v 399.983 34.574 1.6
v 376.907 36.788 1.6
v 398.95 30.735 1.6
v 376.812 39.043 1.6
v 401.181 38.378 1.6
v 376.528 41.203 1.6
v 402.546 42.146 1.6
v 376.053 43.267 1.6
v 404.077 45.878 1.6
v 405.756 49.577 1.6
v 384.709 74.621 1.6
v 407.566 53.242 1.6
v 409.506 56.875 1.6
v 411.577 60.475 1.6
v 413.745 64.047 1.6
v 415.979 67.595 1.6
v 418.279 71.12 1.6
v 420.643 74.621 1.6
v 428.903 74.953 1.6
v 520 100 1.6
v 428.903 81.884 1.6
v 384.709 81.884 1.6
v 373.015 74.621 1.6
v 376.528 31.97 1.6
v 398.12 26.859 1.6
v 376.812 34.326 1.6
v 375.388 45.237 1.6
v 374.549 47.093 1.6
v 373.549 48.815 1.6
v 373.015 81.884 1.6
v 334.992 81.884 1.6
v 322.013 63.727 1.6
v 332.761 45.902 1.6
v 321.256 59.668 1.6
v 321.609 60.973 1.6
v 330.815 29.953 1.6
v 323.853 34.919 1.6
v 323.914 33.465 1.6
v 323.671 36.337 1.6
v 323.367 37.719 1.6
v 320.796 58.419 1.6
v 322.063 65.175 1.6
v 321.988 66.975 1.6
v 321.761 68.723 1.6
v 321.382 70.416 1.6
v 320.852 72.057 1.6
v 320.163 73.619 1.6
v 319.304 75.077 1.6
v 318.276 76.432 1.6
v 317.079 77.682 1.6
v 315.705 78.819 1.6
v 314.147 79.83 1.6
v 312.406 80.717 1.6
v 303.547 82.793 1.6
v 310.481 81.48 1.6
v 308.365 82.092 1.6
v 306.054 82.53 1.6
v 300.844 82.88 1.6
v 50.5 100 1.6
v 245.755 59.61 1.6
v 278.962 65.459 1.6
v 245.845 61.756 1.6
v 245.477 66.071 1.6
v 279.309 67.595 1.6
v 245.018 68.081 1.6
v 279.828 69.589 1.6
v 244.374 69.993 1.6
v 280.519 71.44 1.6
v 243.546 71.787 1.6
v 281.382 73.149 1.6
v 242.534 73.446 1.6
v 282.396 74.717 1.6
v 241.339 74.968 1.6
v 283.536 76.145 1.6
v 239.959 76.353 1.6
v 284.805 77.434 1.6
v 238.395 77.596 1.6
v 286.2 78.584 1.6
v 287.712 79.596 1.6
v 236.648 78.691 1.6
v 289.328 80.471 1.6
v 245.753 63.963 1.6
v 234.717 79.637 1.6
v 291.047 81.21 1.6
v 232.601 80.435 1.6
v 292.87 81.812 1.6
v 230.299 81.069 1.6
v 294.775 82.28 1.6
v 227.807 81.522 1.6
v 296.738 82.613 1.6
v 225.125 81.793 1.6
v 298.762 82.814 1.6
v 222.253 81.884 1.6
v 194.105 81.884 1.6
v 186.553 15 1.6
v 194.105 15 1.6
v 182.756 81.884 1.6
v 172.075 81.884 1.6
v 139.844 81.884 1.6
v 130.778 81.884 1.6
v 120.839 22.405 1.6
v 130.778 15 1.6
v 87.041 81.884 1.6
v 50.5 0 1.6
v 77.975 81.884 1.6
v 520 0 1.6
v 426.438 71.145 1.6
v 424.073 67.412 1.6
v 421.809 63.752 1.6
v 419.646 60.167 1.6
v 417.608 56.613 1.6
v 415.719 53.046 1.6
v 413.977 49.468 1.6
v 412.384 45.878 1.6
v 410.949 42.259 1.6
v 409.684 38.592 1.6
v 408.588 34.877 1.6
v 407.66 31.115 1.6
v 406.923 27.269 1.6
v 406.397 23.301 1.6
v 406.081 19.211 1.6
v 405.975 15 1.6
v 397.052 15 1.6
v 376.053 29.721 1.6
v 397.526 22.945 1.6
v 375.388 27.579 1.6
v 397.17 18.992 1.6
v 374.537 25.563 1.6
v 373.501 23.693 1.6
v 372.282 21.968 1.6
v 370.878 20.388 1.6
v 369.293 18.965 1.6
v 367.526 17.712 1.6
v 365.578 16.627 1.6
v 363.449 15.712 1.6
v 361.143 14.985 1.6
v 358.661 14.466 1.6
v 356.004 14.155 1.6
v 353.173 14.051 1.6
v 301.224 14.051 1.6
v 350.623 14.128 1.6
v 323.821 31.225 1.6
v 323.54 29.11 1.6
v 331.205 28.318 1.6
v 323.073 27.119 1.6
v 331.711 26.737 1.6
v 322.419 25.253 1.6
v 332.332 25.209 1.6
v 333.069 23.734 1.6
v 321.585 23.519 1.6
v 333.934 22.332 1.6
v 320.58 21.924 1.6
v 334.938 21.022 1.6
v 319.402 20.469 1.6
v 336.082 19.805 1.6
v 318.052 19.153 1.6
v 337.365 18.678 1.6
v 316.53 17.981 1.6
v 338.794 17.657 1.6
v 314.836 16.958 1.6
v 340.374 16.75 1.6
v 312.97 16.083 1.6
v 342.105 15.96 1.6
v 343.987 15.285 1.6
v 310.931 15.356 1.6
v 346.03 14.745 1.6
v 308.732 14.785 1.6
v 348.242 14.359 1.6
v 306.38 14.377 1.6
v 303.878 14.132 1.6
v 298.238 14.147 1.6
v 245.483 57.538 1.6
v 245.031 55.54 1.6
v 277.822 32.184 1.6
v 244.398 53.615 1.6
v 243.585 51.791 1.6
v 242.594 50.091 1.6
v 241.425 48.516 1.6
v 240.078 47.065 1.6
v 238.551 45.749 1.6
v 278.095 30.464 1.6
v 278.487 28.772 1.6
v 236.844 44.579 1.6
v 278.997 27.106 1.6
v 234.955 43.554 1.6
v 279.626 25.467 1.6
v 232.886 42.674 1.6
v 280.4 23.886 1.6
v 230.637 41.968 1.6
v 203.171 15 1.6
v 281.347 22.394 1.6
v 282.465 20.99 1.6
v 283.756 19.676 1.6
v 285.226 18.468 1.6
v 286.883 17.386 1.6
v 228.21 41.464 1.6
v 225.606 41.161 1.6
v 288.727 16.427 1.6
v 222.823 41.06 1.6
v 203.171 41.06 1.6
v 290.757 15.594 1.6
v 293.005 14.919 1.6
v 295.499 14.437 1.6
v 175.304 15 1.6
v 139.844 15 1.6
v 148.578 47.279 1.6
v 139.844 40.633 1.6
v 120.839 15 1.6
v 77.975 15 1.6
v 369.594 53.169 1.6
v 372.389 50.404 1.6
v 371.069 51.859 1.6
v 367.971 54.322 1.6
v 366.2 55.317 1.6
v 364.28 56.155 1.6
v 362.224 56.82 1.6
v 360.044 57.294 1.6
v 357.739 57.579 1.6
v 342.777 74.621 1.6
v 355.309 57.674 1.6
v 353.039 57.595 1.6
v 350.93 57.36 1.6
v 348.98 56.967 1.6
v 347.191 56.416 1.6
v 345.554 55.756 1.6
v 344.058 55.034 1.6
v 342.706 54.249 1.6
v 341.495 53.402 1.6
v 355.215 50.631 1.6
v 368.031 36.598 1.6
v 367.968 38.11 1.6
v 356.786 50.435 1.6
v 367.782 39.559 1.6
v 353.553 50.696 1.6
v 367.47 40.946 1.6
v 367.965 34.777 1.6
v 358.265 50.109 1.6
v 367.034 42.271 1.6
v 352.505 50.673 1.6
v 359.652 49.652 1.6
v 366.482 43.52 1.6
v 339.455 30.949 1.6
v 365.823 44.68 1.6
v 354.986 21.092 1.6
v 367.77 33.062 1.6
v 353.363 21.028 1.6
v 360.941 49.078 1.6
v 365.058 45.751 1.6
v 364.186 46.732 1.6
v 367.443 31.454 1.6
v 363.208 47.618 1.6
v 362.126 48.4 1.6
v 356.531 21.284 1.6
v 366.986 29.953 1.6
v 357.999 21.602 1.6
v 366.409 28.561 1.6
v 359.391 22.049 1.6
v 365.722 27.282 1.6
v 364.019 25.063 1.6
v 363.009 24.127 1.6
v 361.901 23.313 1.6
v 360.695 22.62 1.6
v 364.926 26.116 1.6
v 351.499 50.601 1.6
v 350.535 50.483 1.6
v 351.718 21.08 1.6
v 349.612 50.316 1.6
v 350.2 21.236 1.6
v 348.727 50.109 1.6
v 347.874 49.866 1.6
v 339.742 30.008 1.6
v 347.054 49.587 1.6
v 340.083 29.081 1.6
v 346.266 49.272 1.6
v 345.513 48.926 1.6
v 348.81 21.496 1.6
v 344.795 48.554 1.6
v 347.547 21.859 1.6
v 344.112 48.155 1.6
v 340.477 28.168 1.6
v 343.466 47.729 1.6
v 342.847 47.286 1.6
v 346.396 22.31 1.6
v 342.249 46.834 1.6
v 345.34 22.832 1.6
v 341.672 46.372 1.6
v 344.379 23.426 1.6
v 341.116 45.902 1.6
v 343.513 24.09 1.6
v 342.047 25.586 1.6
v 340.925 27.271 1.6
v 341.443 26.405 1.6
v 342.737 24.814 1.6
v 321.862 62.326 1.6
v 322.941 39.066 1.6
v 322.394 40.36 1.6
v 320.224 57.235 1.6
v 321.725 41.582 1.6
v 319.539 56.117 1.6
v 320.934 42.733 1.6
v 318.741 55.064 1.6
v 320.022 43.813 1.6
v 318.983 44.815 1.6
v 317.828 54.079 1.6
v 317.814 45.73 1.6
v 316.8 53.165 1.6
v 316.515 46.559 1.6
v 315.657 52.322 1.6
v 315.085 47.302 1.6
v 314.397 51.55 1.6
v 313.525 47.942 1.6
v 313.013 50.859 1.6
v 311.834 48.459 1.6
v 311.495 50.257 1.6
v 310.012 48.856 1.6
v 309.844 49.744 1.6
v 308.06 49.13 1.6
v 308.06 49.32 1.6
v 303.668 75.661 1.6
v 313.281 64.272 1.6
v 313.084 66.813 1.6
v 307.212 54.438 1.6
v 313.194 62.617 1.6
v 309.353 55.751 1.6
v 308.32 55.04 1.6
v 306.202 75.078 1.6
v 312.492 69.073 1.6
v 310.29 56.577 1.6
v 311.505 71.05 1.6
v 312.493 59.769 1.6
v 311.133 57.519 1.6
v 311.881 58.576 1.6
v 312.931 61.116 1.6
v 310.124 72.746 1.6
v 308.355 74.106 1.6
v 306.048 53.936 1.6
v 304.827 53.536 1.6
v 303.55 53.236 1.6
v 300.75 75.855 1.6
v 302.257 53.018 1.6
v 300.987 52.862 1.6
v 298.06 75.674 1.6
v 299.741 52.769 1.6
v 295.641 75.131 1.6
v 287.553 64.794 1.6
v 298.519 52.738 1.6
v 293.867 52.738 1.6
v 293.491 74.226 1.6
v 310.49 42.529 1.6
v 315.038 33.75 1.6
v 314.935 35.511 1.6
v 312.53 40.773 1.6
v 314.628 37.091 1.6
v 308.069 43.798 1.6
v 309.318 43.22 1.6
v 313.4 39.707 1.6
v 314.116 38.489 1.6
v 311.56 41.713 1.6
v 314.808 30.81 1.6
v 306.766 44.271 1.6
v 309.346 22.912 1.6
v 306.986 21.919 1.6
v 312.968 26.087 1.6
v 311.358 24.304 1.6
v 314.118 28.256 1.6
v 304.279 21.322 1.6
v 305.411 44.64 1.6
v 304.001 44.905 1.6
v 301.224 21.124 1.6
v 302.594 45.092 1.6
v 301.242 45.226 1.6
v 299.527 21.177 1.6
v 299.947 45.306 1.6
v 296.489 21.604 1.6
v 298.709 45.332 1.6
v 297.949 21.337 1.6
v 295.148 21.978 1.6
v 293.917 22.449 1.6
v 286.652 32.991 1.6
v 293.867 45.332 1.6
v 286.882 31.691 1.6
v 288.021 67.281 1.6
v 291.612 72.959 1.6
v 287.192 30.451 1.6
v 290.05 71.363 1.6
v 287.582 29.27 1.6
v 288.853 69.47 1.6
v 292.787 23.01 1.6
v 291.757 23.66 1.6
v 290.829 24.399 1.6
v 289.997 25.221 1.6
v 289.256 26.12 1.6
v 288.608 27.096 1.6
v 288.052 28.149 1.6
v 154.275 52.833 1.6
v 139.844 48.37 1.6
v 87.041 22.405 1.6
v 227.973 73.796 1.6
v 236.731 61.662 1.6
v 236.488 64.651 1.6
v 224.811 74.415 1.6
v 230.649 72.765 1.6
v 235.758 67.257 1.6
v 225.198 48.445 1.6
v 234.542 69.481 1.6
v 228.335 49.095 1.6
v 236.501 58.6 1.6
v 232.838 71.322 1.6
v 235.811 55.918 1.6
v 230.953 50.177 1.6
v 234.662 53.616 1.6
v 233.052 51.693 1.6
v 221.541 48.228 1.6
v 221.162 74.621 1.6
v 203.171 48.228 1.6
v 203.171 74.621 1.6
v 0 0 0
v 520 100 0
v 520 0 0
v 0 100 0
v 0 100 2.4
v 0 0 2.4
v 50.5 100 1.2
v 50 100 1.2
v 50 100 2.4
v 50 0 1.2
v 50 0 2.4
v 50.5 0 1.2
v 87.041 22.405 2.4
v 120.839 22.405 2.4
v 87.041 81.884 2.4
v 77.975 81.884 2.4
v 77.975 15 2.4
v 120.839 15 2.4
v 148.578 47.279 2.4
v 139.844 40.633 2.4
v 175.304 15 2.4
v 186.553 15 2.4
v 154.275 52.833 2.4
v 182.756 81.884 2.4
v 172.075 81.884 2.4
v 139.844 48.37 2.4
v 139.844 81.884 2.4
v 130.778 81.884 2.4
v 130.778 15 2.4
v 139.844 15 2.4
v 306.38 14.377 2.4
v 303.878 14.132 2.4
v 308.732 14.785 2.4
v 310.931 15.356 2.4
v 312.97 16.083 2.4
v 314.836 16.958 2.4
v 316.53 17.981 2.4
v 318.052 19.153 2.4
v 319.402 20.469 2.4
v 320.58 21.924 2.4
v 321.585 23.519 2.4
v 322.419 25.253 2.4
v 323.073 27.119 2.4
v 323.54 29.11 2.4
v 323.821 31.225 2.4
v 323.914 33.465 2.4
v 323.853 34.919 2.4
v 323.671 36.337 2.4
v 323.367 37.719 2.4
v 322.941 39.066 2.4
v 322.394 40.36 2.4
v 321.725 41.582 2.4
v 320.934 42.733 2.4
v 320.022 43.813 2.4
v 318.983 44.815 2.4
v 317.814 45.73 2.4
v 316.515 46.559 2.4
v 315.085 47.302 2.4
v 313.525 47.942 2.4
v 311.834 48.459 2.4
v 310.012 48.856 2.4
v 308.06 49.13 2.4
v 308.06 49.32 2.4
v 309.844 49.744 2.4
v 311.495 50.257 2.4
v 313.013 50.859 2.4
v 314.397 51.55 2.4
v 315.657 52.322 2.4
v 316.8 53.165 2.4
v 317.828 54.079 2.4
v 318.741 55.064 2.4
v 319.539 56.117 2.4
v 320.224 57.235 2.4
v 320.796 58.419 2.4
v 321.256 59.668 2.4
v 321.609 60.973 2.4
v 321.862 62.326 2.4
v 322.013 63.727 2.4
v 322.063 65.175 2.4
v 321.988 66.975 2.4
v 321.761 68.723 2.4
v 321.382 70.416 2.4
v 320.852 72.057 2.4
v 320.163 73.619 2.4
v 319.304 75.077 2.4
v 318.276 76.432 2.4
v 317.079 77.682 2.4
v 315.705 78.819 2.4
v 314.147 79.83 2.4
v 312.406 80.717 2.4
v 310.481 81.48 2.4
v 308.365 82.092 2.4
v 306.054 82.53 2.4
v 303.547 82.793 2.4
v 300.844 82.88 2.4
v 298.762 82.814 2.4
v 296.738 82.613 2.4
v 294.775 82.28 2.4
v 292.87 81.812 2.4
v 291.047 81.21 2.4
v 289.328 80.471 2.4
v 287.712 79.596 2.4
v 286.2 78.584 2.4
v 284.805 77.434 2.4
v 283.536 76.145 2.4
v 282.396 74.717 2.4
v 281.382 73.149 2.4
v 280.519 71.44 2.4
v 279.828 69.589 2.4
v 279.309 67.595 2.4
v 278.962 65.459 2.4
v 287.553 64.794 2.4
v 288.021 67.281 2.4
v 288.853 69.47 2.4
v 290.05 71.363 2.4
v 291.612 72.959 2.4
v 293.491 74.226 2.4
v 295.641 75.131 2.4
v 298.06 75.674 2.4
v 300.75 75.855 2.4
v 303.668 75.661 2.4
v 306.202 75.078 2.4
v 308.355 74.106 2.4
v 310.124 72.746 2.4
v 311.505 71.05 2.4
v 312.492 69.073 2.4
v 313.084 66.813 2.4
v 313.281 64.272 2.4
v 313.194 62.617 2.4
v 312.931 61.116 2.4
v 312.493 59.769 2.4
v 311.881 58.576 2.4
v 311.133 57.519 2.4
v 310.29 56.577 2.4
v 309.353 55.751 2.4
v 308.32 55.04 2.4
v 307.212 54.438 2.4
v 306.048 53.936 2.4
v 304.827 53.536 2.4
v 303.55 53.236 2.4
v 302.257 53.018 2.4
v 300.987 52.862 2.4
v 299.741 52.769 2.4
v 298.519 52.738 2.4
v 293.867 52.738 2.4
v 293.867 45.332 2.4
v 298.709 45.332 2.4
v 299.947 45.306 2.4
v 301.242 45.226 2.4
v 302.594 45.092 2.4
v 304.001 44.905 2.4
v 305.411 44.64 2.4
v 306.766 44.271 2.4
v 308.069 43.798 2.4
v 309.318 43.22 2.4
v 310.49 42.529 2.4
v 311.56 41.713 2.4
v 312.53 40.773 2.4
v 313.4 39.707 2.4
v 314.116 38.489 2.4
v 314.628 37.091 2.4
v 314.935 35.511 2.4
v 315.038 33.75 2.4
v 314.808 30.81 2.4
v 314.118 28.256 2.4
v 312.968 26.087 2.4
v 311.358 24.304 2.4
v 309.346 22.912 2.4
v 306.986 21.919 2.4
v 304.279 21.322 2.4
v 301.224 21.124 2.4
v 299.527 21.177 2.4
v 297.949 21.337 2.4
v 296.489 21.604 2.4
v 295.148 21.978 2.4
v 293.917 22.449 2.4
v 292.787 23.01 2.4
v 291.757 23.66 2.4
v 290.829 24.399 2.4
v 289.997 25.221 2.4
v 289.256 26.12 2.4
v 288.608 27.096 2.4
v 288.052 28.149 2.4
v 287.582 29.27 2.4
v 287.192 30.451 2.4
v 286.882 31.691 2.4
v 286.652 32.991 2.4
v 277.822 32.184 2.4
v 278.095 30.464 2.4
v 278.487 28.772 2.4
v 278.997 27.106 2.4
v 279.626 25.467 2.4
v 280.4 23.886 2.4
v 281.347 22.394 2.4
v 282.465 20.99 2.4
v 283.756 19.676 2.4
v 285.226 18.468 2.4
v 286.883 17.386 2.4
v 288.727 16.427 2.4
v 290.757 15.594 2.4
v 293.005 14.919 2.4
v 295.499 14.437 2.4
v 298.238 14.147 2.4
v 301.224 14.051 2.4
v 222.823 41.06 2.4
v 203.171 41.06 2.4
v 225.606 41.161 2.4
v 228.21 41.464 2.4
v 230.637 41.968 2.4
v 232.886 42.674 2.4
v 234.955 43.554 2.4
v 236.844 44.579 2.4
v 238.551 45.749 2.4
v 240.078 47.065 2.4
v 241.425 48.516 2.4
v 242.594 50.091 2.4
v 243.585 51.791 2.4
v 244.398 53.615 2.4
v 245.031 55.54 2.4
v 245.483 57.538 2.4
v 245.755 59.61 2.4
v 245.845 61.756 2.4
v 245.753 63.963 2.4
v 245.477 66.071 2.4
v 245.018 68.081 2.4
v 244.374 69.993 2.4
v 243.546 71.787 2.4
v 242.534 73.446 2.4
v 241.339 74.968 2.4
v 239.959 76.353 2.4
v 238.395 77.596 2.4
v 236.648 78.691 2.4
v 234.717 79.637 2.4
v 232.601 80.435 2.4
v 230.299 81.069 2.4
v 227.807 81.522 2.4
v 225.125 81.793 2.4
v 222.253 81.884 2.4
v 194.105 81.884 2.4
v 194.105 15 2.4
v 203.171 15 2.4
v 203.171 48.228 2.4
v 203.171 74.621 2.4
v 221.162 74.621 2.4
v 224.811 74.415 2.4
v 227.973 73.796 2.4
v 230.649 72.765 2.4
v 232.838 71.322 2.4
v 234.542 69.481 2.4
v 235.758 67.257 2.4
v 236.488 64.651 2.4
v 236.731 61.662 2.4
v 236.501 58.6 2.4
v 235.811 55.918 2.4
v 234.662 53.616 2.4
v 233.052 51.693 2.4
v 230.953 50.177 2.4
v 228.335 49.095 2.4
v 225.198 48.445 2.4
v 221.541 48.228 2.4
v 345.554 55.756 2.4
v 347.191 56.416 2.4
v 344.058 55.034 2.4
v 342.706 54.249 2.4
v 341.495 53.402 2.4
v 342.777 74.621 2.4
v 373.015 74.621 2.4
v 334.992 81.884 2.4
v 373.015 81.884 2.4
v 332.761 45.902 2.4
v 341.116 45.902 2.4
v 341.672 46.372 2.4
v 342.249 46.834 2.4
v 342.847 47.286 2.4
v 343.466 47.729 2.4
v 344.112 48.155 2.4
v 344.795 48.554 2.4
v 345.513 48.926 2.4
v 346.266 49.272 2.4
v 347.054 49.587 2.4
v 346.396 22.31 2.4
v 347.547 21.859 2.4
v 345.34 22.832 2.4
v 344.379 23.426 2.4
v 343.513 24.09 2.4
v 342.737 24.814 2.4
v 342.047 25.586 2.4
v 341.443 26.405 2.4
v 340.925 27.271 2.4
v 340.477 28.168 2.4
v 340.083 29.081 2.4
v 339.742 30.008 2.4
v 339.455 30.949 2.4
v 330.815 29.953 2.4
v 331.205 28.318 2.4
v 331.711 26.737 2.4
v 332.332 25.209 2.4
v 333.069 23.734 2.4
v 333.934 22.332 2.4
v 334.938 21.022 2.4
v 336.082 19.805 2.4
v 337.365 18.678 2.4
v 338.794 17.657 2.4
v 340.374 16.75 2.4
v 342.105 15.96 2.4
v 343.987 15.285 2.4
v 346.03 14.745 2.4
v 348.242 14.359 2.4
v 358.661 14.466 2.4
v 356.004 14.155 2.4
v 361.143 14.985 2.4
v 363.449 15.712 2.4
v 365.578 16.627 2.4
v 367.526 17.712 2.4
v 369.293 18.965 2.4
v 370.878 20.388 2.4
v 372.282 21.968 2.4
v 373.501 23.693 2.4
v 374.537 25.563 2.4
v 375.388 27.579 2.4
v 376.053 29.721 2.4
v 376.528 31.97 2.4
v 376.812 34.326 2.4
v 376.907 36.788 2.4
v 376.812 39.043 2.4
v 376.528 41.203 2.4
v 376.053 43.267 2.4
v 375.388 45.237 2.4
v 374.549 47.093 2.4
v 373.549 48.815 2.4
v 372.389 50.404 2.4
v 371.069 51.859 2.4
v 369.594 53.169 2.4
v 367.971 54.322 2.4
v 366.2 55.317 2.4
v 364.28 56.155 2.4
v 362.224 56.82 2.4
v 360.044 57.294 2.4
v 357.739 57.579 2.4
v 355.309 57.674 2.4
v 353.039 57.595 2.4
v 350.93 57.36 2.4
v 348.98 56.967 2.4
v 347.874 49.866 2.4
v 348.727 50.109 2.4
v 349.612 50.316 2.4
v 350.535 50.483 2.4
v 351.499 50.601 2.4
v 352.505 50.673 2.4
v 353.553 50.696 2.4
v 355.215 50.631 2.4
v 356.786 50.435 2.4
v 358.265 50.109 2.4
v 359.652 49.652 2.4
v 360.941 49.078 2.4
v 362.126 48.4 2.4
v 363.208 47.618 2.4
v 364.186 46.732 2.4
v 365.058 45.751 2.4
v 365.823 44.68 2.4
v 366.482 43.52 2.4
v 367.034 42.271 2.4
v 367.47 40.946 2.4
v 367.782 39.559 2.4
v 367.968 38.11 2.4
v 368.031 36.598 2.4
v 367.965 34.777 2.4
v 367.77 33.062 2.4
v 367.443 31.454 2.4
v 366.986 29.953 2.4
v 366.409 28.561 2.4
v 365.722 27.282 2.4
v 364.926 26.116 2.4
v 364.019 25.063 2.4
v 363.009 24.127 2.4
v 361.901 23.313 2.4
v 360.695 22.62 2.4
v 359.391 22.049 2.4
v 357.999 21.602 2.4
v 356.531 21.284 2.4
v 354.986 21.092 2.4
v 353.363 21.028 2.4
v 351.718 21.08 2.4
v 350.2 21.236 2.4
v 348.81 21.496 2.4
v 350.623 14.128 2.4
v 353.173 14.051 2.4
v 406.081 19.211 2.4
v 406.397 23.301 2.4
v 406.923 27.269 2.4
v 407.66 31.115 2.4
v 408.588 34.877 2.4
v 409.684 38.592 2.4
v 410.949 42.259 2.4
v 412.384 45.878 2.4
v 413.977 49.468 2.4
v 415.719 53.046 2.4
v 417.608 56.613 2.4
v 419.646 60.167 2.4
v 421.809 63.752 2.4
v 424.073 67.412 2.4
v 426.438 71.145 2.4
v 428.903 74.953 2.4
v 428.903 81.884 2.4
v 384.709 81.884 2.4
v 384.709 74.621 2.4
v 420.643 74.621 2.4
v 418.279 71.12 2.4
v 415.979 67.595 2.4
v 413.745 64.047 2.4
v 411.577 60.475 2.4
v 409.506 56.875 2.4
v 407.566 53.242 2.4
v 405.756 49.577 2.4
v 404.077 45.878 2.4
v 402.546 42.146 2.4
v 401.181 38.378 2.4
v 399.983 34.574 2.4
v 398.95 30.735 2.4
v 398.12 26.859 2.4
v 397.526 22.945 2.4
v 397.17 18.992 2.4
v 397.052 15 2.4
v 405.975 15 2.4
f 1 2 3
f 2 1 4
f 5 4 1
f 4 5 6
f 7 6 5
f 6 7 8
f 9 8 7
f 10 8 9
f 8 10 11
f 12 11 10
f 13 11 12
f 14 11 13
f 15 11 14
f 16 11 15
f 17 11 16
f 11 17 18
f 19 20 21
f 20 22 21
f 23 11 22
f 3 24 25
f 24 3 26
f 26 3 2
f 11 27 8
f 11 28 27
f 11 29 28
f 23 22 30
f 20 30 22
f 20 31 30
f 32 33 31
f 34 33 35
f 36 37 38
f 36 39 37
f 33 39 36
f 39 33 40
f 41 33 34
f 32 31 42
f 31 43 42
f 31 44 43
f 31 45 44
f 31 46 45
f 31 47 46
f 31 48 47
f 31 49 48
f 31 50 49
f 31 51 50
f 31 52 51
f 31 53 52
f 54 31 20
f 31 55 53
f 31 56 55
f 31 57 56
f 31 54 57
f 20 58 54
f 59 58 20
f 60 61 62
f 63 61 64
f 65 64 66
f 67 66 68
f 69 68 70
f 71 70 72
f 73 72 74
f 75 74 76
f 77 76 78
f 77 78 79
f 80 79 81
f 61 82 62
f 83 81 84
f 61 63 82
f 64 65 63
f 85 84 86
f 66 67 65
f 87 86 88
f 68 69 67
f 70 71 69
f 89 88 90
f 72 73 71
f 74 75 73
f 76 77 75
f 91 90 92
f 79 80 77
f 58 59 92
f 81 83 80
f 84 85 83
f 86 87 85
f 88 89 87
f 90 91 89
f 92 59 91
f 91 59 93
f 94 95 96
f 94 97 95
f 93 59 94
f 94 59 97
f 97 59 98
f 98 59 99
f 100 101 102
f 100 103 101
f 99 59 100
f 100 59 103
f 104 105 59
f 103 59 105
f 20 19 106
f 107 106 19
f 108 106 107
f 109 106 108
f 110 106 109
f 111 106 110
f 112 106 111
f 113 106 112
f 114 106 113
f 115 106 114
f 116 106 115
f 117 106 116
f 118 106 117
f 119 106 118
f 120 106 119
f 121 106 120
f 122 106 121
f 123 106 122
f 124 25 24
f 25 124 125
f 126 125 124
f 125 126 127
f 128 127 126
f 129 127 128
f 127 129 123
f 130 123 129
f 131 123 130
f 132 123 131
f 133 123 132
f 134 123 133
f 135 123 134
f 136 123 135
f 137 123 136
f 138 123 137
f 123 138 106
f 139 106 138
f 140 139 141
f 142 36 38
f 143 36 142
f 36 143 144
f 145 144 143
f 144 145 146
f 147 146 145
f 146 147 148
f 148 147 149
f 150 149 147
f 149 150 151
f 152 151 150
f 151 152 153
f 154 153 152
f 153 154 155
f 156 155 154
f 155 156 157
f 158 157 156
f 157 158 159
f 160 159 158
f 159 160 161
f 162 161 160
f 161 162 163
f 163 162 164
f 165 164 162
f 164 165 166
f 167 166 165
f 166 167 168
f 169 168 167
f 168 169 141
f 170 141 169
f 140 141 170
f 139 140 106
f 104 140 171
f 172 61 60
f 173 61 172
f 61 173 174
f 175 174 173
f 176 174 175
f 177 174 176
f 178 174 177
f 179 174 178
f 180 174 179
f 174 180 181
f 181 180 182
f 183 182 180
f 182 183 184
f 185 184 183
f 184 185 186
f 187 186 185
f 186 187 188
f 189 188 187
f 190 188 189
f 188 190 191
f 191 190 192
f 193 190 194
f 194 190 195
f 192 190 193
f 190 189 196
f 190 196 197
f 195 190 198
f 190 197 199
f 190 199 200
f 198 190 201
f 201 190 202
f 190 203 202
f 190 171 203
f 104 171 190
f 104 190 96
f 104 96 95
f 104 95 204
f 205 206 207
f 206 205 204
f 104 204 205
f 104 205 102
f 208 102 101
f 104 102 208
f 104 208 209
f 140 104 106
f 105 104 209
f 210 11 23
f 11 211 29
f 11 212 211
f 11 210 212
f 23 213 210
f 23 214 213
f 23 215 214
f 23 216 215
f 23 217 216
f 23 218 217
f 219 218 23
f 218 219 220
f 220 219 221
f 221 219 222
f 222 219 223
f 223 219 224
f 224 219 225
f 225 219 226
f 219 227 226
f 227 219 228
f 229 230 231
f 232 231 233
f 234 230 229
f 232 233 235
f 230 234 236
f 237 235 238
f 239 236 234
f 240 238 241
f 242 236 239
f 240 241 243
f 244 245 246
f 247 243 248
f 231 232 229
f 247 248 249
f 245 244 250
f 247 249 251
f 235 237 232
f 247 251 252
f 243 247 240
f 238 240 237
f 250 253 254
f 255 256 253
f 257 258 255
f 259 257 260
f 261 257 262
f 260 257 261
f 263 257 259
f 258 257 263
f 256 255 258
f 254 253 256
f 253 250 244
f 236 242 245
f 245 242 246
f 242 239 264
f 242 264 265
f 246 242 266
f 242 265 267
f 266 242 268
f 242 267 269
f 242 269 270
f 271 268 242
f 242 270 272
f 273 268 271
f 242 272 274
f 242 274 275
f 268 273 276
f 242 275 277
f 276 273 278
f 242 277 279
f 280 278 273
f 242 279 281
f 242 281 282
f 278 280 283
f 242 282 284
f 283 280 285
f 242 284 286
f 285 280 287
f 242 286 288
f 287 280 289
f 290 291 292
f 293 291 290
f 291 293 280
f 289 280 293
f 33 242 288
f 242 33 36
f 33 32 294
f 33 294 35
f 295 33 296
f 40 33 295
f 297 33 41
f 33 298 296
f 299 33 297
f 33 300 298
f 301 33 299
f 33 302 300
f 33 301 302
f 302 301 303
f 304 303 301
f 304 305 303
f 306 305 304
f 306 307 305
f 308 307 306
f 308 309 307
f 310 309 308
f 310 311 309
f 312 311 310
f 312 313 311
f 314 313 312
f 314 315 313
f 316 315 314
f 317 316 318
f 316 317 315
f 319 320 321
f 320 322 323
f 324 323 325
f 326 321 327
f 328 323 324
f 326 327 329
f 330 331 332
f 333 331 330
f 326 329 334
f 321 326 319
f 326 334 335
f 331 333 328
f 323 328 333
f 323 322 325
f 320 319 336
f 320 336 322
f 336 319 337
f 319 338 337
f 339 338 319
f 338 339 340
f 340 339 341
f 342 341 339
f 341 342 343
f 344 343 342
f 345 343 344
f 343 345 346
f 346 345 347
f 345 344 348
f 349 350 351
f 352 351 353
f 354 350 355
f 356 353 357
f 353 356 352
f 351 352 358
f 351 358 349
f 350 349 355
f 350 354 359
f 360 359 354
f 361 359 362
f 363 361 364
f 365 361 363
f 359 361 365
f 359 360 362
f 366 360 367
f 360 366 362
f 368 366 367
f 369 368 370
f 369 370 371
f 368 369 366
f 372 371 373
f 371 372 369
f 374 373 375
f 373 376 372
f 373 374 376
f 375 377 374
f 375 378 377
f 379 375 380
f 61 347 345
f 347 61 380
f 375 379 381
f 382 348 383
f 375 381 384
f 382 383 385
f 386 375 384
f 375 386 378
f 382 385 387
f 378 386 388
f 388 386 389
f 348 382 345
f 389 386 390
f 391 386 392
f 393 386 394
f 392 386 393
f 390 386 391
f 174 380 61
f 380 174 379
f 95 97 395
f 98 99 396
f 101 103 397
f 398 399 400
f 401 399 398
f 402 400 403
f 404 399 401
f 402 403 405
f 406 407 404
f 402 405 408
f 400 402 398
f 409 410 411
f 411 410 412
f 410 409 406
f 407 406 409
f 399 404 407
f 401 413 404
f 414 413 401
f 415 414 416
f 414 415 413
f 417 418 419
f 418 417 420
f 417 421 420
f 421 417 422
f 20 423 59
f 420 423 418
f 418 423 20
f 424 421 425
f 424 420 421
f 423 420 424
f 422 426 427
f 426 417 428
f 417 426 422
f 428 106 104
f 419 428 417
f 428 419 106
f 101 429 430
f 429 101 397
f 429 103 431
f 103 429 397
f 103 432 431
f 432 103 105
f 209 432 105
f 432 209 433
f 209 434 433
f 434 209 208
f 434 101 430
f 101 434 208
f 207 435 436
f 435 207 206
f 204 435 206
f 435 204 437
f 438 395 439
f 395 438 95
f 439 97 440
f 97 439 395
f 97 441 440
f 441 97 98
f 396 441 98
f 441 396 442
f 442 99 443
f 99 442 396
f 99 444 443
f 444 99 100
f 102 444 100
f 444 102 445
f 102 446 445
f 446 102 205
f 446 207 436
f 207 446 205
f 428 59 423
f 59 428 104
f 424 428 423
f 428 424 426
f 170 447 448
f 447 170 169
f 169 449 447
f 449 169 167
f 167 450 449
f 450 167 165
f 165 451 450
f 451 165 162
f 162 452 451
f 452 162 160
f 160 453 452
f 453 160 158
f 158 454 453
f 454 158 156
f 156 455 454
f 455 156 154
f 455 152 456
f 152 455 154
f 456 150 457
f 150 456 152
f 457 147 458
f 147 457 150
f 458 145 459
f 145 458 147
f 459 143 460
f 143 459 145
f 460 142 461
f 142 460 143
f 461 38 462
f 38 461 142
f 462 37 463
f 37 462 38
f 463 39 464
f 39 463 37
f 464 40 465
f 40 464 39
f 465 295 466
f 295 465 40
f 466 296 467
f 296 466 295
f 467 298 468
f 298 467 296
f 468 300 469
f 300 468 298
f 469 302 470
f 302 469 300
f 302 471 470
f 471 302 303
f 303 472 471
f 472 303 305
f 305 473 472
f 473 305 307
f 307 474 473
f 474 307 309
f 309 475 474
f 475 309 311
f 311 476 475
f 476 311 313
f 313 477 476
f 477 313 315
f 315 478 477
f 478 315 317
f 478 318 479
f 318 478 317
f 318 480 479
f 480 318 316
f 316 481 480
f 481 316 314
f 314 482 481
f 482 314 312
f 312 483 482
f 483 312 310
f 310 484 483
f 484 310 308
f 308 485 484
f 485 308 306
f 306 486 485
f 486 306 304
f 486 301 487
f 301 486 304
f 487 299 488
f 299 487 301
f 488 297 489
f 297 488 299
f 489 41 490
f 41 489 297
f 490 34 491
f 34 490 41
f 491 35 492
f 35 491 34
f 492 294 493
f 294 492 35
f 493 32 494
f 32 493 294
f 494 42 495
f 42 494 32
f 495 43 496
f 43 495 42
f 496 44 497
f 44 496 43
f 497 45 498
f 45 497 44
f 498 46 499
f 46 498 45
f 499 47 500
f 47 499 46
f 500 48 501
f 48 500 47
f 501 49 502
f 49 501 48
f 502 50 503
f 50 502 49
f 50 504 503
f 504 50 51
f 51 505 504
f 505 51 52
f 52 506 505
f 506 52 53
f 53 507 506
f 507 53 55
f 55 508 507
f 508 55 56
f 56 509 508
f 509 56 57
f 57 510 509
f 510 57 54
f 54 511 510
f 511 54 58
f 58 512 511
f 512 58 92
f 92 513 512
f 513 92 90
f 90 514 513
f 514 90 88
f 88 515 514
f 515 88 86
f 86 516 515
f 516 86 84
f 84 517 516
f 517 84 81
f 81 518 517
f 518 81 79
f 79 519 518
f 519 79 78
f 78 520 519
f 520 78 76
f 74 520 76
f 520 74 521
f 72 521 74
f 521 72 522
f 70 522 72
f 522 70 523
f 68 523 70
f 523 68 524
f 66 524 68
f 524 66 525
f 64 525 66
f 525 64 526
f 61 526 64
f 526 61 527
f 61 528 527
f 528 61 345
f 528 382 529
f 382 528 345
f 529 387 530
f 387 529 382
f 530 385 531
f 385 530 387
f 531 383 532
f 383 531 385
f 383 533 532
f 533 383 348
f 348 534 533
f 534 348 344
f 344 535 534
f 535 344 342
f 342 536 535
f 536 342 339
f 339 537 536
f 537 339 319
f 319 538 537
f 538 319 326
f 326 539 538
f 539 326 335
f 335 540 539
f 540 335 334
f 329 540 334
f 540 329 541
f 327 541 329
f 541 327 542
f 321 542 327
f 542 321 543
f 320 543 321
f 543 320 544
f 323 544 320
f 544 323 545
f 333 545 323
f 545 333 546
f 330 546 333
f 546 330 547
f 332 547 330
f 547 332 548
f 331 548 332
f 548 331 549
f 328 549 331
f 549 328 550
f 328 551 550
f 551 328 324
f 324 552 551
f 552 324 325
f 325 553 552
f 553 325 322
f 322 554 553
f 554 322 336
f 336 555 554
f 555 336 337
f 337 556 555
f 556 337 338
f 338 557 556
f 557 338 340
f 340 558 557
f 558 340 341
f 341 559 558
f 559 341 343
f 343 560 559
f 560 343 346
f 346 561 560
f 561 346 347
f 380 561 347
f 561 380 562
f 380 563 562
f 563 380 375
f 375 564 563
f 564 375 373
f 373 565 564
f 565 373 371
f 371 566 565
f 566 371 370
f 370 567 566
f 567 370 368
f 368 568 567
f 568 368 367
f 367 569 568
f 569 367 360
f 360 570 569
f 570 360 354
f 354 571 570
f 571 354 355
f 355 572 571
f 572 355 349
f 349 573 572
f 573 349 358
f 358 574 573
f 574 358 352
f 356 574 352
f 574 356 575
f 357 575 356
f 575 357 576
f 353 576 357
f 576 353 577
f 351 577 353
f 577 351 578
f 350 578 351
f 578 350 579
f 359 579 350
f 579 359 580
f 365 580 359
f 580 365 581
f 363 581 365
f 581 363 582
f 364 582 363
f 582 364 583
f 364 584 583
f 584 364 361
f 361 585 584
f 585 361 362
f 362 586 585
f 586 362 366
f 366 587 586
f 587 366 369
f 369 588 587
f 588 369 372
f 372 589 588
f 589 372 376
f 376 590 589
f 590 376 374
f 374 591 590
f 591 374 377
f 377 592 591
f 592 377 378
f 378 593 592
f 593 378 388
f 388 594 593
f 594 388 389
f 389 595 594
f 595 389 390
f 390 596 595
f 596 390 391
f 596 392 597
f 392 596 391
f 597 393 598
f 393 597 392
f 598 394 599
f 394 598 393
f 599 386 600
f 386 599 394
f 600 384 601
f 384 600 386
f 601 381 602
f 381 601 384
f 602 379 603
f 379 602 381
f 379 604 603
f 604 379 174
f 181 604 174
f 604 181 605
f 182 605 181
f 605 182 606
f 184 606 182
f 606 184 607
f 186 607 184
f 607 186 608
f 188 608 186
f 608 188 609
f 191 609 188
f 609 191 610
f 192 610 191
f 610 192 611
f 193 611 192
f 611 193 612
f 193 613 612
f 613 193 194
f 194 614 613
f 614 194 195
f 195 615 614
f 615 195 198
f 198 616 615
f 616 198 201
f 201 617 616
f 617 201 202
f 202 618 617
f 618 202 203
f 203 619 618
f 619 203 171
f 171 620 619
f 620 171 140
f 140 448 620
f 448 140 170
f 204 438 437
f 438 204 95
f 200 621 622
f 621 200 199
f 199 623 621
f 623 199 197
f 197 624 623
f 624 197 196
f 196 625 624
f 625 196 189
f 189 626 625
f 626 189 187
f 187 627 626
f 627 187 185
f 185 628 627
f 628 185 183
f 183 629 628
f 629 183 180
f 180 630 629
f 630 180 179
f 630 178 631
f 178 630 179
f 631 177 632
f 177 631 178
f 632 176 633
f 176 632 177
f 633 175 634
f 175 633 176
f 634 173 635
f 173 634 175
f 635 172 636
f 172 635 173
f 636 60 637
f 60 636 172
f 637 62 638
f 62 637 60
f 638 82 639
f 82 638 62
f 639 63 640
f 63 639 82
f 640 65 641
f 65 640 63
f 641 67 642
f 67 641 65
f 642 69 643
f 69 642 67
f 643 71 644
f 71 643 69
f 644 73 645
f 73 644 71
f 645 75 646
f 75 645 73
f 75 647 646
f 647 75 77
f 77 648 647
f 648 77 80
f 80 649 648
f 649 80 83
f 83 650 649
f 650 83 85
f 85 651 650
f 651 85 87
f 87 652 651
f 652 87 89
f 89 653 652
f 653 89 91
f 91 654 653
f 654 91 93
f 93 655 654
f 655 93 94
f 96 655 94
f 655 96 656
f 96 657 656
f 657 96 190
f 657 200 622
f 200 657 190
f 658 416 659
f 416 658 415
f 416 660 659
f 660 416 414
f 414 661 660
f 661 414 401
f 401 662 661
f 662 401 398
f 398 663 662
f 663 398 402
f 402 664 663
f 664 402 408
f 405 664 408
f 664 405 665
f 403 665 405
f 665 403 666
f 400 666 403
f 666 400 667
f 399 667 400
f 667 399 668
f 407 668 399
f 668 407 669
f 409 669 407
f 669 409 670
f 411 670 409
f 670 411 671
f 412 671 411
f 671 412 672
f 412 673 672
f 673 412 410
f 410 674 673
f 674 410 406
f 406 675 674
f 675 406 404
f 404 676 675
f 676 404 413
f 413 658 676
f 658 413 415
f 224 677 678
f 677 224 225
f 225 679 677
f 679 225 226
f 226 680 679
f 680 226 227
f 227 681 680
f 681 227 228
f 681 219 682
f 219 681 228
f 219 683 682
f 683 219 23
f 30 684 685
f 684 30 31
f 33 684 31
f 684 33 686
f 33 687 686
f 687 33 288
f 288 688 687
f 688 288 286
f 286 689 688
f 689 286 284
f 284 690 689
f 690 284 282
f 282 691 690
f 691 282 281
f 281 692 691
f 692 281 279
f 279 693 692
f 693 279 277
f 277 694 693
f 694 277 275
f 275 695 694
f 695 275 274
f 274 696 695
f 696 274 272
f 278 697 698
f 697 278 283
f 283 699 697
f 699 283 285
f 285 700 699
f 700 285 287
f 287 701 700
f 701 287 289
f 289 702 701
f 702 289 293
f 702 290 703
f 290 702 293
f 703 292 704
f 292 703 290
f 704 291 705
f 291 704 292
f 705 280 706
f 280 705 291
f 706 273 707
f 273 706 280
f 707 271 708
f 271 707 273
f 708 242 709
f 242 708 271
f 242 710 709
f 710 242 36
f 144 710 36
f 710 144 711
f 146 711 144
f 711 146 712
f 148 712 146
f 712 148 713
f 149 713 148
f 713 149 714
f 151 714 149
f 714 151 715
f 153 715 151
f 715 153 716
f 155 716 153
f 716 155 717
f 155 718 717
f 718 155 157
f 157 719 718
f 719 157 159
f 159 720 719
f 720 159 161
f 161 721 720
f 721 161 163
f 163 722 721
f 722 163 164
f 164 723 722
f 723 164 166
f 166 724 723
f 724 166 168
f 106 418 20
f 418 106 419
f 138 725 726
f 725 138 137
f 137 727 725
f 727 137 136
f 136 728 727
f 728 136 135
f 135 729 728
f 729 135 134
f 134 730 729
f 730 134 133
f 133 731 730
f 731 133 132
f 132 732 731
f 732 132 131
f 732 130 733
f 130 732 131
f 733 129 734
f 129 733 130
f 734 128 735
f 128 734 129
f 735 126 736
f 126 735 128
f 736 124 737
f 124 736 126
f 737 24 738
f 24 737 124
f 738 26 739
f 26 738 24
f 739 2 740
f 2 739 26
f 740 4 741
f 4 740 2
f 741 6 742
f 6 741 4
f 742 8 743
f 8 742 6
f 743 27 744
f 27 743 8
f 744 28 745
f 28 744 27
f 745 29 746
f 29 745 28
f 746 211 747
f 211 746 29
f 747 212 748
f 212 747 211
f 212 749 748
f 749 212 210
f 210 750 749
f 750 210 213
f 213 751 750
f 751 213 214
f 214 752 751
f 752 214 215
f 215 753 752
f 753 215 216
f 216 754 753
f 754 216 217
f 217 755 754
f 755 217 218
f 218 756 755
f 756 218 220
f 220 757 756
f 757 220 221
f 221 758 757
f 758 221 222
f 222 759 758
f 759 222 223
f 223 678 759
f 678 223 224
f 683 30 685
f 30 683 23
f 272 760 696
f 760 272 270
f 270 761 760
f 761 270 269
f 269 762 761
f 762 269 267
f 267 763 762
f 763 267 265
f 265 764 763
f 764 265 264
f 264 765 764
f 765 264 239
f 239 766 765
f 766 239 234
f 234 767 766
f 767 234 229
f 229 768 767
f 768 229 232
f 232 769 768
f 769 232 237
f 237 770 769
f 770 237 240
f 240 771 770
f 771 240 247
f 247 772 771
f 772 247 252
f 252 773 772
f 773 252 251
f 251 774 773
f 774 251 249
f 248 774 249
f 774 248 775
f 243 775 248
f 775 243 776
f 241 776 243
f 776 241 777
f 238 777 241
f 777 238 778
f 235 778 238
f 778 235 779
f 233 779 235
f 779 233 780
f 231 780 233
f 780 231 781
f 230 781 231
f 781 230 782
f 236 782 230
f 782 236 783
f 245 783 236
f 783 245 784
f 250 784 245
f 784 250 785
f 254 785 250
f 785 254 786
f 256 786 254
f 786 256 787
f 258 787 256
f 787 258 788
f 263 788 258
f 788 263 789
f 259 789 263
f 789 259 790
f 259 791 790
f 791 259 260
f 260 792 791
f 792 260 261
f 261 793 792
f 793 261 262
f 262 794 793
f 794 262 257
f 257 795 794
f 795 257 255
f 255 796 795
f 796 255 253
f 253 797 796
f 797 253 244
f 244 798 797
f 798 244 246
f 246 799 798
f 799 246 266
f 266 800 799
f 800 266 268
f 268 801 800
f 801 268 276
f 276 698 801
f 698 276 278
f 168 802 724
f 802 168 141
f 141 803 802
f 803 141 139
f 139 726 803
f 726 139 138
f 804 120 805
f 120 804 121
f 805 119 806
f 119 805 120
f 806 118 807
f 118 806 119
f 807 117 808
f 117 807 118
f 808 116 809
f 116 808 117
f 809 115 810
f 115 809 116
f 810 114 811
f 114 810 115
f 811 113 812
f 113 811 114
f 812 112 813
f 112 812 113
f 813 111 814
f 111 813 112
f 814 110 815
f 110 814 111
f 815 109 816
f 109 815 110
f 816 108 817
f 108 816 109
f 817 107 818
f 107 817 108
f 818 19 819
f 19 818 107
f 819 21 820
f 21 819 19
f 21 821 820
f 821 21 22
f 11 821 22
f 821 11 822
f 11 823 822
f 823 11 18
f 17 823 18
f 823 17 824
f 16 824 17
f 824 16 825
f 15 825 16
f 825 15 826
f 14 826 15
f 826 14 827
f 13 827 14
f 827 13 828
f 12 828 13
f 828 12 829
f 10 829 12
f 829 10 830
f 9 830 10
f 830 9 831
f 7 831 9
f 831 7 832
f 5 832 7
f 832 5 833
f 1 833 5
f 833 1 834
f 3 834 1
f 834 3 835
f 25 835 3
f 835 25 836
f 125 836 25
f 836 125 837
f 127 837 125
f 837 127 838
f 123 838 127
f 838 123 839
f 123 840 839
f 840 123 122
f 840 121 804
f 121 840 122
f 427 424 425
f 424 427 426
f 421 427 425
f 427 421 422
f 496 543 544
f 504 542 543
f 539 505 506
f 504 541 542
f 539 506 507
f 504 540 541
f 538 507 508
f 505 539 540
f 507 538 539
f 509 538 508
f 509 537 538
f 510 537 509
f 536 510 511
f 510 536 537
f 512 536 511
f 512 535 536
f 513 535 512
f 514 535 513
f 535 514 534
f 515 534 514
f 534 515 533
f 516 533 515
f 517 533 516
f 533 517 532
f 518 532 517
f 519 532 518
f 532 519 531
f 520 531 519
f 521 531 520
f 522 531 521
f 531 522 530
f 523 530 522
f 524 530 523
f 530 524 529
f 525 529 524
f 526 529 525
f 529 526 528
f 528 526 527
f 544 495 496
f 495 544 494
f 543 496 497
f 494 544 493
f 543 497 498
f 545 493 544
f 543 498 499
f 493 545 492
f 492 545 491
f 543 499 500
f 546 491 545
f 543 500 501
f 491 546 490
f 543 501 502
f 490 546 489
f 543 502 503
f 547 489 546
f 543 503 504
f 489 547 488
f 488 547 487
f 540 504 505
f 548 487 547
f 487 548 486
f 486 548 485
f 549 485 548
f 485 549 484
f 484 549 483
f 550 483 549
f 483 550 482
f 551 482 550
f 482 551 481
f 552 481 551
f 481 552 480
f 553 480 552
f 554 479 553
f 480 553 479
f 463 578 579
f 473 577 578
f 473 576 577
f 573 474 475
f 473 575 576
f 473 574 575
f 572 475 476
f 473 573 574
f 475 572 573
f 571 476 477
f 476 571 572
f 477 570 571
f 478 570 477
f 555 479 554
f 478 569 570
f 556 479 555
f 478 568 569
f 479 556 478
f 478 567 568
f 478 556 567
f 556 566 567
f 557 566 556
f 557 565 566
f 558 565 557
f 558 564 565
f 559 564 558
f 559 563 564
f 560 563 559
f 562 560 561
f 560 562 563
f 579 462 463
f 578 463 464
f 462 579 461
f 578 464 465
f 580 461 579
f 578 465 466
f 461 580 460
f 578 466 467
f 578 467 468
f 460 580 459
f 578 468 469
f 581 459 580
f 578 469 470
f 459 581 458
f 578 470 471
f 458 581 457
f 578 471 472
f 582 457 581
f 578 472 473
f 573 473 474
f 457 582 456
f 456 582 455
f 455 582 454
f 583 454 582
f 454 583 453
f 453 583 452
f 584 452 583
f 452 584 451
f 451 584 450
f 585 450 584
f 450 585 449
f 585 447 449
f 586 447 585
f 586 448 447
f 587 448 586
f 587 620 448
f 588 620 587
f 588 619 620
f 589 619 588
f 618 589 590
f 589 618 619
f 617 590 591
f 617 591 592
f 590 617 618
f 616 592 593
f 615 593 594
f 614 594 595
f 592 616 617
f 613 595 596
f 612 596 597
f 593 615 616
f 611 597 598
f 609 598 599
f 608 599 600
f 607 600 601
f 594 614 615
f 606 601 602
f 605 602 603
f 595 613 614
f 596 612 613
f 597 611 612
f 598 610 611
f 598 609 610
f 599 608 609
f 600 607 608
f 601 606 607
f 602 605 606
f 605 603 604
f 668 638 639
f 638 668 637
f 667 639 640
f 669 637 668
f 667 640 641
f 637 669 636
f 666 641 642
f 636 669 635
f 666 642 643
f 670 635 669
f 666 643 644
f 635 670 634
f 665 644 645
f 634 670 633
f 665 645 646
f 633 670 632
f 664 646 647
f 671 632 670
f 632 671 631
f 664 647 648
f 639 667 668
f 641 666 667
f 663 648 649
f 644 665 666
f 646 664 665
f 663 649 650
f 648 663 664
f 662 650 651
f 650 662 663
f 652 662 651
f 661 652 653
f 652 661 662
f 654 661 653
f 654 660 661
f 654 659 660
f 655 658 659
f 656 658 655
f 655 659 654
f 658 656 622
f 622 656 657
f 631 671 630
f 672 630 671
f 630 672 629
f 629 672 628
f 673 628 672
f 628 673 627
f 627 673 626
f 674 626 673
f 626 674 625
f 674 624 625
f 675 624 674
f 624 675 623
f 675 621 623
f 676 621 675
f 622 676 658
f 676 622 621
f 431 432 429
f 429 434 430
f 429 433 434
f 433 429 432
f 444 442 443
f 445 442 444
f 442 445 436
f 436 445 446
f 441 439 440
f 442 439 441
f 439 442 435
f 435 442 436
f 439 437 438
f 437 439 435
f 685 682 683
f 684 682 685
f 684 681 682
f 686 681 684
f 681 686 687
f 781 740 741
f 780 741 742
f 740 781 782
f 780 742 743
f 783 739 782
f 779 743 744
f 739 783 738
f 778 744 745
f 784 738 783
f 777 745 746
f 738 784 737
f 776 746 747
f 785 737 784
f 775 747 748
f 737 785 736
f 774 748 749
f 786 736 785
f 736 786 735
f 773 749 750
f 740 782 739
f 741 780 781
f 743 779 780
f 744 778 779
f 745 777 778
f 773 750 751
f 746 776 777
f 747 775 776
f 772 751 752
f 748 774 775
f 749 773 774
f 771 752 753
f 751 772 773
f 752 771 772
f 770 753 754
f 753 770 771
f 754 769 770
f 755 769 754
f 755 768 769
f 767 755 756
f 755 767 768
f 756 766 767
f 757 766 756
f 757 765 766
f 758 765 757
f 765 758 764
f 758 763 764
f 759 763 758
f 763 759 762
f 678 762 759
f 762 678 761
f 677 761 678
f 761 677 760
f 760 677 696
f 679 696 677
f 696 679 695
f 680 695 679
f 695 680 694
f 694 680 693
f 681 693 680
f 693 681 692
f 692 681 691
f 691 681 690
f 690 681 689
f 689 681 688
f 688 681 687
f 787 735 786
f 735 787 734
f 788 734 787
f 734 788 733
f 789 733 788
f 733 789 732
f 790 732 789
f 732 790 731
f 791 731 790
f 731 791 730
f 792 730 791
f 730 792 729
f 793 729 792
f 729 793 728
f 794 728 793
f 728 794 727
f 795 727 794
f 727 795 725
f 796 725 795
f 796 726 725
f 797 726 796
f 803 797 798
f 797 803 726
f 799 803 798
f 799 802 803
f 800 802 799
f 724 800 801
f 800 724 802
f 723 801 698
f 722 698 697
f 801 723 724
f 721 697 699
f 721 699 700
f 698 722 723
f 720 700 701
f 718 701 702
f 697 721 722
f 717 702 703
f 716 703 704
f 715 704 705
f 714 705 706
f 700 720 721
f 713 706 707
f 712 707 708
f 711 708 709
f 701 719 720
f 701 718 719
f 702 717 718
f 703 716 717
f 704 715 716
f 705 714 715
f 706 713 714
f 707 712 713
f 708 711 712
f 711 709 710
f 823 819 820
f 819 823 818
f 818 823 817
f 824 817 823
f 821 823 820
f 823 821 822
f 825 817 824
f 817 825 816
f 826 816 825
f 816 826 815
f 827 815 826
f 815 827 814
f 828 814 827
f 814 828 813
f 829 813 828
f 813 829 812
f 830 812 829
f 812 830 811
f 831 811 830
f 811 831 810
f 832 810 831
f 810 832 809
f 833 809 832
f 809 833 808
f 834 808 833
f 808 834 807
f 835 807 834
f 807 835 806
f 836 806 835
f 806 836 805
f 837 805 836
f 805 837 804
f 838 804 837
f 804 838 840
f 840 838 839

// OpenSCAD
//cube ([220,220,240]); //My printing space
npString=   "LKP 357";
npWidth=    520;
npHeight=   100;
npThickness=   1.6;
quarterT =   npThickness/4;
npTextH=    70;
npTextO=    (npHeight-npTextH)/2;
maxx=   200;
maxy=   200;
maxz=   220;
npFont= "Liberation Sans";
//npFont= "DejaVu Sans";

color ("White") {
difference() {
    translate ([0,0,0]) cube([npWidth/3,npHeight,npThickness]); //first third
    translate([npTextH,npTextO,3*quarterT])
    linear_extrude(height=quarterT,center=false,convexity=0,twist=0,slices=1, scale=1.0) {text(npString, npTextH, font=npFont);}
    translate ([-0.5,-0.5,1.2]) cube([51,101,1.2]);
    }
difference() {
    translate ([1*npWidth/3,0,0]) cube([npWidth/3,npHeight,npThickness]); //2nd third
    translate([npTextH,npTextO,3*quarterT])
    linear_extrude(height=quarterT,center=false,convexity=0,twist=0,slices=1, scale=1.0) {text(npString, npTextH, font=npFont);}
    translate ([-0.5,-0.5,1.2]) cube([51,101,1.2]);
    }
difference() {
    translate ([2*npWidth/3,0,0]) cube([npWidth/3,npHeight,npThickness]); //3rd third
    translate([npTextH,npTextO,3*quarterT])
    linear_extrude(height=quarterT,center=false,convexity=0,twist=0,slices=1, scale=1.0) {text(npString, npTextH, font=npFont);}
    translate ([-0.5,-0.5,1.2]) cube([51,101,1.2]);
    }
}

translate ([0,0,1.2]){color ("Black") cube([50,100,1.2]);}
translate ([npTextH,npTextO,3*quarterT]) {
    color ("Black")
    linear_extrude(height=3*quarterT,center=false,convexity=0,twist=0,slices=1, scale=1.0) {text(npString, npTextH, font=npFont);}
    }
    
